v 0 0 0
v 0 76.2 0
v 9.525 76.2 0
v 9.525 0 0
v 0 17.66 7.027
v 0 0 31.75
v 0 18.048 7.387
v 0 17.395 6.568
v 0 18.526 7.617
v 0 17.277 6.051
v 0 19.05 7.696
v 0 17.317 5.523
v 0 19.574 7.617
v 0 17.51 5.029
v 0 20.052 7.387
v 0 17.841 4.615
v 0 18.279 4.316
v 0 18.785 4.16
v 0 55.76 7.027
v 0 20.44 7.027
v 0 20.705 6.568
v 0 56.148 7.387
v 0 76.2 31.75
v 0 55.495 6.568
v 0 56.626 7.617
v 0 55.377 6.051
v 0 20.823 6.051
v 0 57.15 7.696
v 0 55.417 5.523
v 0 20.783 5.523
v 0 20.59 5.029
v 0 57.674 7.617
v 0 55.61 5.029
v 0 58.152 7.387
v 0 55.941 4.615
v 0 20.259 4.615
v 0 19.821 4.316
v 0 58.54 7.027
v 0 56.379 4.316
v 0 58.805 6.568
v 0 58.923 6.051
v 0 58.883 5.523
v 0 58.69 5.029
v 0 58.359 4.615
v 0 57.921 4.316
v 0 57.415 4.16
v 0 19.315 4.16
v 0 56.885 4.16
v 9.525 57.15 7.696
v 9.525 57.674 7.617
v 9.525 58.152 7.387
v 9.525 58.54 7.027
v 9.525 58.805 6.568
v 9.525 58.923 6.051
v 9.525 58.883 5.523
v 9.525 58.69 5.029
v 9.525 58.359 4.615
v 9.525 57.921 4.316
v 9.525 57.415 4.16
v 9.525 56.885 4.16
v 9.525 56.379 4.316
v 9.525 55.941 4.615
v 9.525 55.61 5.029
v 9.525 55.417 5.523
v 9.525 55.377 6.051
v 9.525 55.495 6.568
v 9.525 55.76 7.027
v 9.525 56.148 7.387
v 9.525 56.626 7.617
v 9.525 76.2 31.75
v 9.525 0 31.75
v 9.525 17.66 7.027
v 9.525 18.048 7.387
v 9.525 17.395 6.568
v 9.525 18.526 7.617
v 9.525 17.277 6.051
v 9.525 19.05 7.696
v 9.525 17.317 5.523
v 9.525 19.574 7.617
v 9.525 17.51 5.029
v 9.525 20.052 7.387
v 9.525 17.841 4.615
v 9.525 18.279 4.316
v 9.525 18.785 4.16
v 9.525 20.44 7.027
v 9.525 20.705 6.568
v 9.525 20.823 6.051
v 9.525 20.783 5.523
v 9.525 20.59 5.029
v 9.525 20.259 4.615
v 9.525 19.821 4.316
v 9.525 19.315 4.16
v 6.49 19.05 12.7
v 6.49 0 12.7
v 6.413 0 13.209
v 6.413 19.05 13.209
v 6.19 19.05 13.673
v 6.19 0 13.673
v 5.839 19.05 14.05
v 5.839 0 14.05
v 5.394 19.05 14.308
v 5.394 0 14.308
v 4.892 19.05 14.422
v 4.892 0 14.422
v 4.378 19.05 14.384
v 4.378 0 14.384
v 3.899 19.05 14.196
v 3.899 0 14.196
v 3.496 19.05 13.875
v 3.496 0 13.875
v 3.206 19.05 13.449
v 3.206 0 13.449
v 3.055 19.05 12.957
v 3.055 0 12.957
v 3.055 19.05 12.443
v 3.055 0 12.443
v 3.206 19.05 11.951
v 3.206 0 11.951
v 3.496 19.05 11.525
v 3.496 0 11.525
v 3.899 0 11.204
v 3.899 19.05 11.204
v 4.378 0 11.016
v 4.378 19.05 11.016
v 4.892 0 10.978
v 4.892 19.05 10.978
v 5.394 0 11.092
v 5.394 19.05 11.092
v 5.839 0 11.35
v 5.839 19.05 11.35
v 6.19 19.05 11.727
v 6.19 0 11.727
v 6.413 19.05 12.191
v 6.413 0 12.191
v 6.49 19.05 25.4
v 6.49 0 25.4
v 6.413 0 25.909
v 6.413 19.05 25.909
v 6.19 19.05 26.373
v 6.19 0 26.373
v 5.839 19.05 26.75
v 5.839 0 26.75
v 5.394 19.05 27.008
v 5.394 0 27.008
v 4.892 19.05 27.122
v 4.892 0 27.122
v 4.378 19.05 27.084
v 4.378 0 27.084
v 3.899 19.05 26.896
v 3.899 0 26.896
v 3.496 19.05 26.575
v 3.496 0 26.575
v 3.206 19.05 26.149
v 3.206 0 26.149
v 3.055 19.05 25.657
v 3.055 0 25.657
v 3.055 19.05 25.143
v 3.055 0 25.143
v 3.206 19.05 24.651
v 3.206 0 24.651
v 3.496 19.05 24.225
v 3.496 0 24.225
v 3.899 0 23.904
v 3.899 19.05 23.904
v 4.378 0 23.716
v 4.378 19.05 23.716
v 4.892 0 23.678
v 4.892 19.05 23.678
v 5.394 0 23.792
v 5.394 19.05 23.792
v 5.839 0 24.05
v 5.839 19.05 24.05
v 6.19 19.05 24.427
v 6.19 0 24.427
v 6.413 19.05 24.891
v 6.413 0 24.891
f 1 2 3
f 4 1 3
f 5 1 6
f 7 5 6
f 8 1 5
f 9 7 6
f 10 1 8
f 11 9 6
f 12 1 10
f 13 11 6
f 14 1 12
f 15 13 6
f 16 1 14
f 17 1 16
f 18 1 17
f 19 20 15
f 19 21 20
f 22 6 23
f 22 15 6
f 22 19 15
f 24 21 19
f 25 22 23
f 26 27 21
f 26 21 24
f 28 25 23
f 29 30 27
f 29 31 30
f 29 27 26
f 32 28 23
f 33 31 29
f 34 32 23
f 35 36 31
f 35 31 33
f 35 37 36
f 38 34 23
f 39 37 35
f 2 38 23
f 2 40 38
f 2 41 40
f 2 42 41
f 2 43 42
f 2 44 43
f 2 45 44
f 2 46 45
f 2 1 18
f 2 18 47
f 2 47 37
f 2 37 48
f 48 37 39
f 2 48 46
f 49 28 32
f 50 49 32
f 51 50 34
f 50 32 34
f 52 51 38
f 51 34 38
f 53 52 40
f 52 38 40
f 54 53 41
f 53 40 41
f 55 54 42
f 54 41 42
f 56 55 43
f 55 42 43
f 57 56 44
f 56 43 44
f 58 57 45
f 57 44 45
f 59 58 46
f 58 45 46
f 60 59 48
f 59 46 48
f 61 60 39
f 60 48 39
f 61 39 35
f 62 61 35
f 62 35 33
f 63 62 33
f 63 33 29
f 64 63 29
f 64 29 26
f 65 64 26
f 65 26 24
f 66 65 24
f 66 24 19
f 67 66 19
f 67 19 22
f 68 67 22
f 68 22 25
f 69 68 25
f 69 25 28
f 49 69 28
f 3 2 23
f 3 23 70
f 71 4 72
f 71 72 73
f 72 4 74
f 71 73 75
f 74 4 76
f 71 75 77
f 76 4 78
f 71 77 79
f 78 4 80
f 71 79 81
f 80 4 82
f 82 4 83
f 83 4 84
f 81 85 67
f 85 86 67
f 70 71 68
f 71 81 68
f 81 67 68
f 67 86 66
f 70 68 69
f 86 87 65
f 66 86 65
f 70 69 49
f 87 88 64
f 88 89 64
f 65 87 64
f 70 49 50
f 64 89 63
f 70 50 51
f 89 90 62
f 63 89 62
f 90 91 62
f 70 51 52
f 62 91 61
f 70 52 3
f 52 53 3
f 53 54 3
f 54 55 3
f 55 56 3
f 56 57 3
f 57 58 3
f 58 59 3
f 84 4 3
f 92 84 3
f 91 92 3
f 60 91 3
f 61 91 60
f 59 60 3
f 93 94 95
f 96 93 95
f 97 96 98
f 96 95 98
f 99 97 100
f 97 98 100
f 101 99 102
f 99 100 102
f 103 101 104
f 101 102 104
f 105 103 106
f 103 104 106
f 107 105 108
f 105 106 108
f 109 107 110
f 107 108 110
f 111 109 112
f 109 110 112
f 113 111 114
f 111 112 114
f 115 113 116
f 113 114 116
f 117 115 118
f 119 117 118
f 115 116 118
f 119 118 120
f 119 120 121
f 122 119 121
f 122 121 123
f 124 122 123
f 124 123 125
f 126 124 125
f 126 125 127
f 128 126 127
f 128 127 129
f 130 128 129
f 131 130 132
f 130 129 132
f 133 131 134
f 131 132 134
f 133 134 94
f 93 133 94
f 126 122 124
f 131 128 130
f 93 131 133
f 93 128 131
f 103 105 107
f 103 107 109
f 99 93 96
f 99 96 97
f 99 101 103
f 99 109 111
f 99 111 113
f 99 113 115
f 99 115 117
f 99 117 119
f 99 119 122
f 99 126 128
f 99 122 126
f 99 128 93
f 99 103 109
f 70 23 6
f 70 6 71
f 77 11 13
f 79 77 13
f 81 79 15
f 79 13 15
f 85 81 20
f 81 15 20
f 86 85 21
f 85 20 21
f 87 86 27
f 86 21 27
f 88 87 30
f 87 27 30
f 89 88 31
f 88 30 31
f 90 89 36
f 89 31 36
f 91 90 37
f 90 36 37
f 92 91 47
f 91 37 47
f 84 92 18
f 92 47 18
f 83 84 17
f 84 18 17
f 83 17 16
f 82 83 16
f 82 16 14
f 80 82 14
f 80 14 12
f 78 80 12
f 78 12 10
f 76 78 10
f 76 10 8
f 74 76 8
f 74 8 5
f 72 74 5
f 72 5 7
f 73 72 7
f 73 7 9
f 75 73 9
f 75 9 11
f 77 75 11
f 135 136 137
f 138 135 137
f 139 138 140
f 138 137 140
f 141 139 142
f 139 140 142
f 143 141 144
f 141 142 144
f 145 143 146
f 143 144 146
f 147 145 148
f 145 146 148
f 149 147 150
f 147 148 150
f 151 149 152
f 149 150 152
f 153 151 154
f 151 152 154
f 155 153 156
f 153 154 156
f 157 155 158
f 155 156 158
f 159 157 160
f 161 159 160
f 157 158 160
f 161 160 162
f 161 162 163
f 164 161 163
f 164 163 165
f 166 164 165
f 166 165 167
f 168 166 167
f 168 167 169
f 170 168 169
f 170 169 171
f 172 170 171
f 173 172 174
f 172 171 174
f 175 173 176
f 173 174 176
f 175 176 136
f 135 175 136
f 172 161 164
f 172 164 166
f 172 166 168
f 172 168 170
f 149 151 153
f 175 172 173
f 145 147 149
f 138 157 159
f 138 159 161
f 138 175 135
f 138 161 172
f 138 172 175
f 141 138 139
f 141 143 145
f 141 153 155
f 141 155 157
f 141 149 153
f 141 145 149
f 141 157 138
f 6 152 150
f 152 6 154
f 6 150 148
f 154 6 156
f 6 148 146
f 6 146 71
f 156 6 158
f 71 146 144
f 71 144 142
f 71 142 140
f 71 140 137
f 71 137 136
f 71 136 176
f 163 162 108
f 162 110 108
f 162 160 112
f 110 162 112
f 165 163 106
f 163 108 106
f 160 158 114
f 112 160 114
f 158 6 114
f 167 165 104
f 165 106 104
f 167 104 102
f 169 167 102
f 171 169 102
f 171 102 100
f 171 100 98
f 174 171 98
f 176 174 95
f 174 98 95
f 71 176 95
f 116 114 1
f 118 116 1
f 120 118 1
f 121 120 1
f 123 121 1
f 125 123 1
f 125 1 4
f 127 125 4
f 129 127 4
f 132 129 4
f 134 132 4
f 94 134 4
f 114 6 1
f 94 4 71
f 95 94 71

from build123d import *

# Parameters (mm, degrees)
SKETCH1_W           = 9.525
SKETCH1_H           = 76.2
BOSS_EXTRUDE1_DEPTH = 31.75
SKETCH2_R           = 1.778
CUT_EXTRUDE1_DEPTH  = 10.525
SKETCH3_R           = 1.7272
CUT_EXTRUDE2_DEPTH  = 19.05


with BuildPart() as part:
    # Sketch1 → Boss-Extrude1 (new body)
    with BuildSketch(Plane.XY):
        with Locations((4.7625, 38.1)):
            Rectangle(SKETCH1_W, SKETCH1_H)
    extrude(amount=BOSS_EXTRUDE1_DEPTH)

    # Sketch2 → Cut-Extrude1 (cut, through all)
    with BuildSketch(Plane.ZY):
        with Locations((5.9182, 57.15)):
            Circle(SKETCH2_R)
        with Locations((5.9182, 19.05)):
            Circle(SKETCH2_R)
    extrude(amount=-CUT_EXTRUDE1_DEPTH, mode=Mode.SUBTRACT)

    # Sketch3 → Cut-Extrude2 (cut)
    with BuildSketch(Plane.XZ):
        with Locations((4.7625, 25.4)):
            Circle(SKETCH3_R)
        with Locations((4.7625, 12.7)):
            Circle(SKETCH3_R)
    extrude(amount=-CUT_EXTRUDE2_DEPTH, mode=Mode.SUBTRACT)


solid = part.part
